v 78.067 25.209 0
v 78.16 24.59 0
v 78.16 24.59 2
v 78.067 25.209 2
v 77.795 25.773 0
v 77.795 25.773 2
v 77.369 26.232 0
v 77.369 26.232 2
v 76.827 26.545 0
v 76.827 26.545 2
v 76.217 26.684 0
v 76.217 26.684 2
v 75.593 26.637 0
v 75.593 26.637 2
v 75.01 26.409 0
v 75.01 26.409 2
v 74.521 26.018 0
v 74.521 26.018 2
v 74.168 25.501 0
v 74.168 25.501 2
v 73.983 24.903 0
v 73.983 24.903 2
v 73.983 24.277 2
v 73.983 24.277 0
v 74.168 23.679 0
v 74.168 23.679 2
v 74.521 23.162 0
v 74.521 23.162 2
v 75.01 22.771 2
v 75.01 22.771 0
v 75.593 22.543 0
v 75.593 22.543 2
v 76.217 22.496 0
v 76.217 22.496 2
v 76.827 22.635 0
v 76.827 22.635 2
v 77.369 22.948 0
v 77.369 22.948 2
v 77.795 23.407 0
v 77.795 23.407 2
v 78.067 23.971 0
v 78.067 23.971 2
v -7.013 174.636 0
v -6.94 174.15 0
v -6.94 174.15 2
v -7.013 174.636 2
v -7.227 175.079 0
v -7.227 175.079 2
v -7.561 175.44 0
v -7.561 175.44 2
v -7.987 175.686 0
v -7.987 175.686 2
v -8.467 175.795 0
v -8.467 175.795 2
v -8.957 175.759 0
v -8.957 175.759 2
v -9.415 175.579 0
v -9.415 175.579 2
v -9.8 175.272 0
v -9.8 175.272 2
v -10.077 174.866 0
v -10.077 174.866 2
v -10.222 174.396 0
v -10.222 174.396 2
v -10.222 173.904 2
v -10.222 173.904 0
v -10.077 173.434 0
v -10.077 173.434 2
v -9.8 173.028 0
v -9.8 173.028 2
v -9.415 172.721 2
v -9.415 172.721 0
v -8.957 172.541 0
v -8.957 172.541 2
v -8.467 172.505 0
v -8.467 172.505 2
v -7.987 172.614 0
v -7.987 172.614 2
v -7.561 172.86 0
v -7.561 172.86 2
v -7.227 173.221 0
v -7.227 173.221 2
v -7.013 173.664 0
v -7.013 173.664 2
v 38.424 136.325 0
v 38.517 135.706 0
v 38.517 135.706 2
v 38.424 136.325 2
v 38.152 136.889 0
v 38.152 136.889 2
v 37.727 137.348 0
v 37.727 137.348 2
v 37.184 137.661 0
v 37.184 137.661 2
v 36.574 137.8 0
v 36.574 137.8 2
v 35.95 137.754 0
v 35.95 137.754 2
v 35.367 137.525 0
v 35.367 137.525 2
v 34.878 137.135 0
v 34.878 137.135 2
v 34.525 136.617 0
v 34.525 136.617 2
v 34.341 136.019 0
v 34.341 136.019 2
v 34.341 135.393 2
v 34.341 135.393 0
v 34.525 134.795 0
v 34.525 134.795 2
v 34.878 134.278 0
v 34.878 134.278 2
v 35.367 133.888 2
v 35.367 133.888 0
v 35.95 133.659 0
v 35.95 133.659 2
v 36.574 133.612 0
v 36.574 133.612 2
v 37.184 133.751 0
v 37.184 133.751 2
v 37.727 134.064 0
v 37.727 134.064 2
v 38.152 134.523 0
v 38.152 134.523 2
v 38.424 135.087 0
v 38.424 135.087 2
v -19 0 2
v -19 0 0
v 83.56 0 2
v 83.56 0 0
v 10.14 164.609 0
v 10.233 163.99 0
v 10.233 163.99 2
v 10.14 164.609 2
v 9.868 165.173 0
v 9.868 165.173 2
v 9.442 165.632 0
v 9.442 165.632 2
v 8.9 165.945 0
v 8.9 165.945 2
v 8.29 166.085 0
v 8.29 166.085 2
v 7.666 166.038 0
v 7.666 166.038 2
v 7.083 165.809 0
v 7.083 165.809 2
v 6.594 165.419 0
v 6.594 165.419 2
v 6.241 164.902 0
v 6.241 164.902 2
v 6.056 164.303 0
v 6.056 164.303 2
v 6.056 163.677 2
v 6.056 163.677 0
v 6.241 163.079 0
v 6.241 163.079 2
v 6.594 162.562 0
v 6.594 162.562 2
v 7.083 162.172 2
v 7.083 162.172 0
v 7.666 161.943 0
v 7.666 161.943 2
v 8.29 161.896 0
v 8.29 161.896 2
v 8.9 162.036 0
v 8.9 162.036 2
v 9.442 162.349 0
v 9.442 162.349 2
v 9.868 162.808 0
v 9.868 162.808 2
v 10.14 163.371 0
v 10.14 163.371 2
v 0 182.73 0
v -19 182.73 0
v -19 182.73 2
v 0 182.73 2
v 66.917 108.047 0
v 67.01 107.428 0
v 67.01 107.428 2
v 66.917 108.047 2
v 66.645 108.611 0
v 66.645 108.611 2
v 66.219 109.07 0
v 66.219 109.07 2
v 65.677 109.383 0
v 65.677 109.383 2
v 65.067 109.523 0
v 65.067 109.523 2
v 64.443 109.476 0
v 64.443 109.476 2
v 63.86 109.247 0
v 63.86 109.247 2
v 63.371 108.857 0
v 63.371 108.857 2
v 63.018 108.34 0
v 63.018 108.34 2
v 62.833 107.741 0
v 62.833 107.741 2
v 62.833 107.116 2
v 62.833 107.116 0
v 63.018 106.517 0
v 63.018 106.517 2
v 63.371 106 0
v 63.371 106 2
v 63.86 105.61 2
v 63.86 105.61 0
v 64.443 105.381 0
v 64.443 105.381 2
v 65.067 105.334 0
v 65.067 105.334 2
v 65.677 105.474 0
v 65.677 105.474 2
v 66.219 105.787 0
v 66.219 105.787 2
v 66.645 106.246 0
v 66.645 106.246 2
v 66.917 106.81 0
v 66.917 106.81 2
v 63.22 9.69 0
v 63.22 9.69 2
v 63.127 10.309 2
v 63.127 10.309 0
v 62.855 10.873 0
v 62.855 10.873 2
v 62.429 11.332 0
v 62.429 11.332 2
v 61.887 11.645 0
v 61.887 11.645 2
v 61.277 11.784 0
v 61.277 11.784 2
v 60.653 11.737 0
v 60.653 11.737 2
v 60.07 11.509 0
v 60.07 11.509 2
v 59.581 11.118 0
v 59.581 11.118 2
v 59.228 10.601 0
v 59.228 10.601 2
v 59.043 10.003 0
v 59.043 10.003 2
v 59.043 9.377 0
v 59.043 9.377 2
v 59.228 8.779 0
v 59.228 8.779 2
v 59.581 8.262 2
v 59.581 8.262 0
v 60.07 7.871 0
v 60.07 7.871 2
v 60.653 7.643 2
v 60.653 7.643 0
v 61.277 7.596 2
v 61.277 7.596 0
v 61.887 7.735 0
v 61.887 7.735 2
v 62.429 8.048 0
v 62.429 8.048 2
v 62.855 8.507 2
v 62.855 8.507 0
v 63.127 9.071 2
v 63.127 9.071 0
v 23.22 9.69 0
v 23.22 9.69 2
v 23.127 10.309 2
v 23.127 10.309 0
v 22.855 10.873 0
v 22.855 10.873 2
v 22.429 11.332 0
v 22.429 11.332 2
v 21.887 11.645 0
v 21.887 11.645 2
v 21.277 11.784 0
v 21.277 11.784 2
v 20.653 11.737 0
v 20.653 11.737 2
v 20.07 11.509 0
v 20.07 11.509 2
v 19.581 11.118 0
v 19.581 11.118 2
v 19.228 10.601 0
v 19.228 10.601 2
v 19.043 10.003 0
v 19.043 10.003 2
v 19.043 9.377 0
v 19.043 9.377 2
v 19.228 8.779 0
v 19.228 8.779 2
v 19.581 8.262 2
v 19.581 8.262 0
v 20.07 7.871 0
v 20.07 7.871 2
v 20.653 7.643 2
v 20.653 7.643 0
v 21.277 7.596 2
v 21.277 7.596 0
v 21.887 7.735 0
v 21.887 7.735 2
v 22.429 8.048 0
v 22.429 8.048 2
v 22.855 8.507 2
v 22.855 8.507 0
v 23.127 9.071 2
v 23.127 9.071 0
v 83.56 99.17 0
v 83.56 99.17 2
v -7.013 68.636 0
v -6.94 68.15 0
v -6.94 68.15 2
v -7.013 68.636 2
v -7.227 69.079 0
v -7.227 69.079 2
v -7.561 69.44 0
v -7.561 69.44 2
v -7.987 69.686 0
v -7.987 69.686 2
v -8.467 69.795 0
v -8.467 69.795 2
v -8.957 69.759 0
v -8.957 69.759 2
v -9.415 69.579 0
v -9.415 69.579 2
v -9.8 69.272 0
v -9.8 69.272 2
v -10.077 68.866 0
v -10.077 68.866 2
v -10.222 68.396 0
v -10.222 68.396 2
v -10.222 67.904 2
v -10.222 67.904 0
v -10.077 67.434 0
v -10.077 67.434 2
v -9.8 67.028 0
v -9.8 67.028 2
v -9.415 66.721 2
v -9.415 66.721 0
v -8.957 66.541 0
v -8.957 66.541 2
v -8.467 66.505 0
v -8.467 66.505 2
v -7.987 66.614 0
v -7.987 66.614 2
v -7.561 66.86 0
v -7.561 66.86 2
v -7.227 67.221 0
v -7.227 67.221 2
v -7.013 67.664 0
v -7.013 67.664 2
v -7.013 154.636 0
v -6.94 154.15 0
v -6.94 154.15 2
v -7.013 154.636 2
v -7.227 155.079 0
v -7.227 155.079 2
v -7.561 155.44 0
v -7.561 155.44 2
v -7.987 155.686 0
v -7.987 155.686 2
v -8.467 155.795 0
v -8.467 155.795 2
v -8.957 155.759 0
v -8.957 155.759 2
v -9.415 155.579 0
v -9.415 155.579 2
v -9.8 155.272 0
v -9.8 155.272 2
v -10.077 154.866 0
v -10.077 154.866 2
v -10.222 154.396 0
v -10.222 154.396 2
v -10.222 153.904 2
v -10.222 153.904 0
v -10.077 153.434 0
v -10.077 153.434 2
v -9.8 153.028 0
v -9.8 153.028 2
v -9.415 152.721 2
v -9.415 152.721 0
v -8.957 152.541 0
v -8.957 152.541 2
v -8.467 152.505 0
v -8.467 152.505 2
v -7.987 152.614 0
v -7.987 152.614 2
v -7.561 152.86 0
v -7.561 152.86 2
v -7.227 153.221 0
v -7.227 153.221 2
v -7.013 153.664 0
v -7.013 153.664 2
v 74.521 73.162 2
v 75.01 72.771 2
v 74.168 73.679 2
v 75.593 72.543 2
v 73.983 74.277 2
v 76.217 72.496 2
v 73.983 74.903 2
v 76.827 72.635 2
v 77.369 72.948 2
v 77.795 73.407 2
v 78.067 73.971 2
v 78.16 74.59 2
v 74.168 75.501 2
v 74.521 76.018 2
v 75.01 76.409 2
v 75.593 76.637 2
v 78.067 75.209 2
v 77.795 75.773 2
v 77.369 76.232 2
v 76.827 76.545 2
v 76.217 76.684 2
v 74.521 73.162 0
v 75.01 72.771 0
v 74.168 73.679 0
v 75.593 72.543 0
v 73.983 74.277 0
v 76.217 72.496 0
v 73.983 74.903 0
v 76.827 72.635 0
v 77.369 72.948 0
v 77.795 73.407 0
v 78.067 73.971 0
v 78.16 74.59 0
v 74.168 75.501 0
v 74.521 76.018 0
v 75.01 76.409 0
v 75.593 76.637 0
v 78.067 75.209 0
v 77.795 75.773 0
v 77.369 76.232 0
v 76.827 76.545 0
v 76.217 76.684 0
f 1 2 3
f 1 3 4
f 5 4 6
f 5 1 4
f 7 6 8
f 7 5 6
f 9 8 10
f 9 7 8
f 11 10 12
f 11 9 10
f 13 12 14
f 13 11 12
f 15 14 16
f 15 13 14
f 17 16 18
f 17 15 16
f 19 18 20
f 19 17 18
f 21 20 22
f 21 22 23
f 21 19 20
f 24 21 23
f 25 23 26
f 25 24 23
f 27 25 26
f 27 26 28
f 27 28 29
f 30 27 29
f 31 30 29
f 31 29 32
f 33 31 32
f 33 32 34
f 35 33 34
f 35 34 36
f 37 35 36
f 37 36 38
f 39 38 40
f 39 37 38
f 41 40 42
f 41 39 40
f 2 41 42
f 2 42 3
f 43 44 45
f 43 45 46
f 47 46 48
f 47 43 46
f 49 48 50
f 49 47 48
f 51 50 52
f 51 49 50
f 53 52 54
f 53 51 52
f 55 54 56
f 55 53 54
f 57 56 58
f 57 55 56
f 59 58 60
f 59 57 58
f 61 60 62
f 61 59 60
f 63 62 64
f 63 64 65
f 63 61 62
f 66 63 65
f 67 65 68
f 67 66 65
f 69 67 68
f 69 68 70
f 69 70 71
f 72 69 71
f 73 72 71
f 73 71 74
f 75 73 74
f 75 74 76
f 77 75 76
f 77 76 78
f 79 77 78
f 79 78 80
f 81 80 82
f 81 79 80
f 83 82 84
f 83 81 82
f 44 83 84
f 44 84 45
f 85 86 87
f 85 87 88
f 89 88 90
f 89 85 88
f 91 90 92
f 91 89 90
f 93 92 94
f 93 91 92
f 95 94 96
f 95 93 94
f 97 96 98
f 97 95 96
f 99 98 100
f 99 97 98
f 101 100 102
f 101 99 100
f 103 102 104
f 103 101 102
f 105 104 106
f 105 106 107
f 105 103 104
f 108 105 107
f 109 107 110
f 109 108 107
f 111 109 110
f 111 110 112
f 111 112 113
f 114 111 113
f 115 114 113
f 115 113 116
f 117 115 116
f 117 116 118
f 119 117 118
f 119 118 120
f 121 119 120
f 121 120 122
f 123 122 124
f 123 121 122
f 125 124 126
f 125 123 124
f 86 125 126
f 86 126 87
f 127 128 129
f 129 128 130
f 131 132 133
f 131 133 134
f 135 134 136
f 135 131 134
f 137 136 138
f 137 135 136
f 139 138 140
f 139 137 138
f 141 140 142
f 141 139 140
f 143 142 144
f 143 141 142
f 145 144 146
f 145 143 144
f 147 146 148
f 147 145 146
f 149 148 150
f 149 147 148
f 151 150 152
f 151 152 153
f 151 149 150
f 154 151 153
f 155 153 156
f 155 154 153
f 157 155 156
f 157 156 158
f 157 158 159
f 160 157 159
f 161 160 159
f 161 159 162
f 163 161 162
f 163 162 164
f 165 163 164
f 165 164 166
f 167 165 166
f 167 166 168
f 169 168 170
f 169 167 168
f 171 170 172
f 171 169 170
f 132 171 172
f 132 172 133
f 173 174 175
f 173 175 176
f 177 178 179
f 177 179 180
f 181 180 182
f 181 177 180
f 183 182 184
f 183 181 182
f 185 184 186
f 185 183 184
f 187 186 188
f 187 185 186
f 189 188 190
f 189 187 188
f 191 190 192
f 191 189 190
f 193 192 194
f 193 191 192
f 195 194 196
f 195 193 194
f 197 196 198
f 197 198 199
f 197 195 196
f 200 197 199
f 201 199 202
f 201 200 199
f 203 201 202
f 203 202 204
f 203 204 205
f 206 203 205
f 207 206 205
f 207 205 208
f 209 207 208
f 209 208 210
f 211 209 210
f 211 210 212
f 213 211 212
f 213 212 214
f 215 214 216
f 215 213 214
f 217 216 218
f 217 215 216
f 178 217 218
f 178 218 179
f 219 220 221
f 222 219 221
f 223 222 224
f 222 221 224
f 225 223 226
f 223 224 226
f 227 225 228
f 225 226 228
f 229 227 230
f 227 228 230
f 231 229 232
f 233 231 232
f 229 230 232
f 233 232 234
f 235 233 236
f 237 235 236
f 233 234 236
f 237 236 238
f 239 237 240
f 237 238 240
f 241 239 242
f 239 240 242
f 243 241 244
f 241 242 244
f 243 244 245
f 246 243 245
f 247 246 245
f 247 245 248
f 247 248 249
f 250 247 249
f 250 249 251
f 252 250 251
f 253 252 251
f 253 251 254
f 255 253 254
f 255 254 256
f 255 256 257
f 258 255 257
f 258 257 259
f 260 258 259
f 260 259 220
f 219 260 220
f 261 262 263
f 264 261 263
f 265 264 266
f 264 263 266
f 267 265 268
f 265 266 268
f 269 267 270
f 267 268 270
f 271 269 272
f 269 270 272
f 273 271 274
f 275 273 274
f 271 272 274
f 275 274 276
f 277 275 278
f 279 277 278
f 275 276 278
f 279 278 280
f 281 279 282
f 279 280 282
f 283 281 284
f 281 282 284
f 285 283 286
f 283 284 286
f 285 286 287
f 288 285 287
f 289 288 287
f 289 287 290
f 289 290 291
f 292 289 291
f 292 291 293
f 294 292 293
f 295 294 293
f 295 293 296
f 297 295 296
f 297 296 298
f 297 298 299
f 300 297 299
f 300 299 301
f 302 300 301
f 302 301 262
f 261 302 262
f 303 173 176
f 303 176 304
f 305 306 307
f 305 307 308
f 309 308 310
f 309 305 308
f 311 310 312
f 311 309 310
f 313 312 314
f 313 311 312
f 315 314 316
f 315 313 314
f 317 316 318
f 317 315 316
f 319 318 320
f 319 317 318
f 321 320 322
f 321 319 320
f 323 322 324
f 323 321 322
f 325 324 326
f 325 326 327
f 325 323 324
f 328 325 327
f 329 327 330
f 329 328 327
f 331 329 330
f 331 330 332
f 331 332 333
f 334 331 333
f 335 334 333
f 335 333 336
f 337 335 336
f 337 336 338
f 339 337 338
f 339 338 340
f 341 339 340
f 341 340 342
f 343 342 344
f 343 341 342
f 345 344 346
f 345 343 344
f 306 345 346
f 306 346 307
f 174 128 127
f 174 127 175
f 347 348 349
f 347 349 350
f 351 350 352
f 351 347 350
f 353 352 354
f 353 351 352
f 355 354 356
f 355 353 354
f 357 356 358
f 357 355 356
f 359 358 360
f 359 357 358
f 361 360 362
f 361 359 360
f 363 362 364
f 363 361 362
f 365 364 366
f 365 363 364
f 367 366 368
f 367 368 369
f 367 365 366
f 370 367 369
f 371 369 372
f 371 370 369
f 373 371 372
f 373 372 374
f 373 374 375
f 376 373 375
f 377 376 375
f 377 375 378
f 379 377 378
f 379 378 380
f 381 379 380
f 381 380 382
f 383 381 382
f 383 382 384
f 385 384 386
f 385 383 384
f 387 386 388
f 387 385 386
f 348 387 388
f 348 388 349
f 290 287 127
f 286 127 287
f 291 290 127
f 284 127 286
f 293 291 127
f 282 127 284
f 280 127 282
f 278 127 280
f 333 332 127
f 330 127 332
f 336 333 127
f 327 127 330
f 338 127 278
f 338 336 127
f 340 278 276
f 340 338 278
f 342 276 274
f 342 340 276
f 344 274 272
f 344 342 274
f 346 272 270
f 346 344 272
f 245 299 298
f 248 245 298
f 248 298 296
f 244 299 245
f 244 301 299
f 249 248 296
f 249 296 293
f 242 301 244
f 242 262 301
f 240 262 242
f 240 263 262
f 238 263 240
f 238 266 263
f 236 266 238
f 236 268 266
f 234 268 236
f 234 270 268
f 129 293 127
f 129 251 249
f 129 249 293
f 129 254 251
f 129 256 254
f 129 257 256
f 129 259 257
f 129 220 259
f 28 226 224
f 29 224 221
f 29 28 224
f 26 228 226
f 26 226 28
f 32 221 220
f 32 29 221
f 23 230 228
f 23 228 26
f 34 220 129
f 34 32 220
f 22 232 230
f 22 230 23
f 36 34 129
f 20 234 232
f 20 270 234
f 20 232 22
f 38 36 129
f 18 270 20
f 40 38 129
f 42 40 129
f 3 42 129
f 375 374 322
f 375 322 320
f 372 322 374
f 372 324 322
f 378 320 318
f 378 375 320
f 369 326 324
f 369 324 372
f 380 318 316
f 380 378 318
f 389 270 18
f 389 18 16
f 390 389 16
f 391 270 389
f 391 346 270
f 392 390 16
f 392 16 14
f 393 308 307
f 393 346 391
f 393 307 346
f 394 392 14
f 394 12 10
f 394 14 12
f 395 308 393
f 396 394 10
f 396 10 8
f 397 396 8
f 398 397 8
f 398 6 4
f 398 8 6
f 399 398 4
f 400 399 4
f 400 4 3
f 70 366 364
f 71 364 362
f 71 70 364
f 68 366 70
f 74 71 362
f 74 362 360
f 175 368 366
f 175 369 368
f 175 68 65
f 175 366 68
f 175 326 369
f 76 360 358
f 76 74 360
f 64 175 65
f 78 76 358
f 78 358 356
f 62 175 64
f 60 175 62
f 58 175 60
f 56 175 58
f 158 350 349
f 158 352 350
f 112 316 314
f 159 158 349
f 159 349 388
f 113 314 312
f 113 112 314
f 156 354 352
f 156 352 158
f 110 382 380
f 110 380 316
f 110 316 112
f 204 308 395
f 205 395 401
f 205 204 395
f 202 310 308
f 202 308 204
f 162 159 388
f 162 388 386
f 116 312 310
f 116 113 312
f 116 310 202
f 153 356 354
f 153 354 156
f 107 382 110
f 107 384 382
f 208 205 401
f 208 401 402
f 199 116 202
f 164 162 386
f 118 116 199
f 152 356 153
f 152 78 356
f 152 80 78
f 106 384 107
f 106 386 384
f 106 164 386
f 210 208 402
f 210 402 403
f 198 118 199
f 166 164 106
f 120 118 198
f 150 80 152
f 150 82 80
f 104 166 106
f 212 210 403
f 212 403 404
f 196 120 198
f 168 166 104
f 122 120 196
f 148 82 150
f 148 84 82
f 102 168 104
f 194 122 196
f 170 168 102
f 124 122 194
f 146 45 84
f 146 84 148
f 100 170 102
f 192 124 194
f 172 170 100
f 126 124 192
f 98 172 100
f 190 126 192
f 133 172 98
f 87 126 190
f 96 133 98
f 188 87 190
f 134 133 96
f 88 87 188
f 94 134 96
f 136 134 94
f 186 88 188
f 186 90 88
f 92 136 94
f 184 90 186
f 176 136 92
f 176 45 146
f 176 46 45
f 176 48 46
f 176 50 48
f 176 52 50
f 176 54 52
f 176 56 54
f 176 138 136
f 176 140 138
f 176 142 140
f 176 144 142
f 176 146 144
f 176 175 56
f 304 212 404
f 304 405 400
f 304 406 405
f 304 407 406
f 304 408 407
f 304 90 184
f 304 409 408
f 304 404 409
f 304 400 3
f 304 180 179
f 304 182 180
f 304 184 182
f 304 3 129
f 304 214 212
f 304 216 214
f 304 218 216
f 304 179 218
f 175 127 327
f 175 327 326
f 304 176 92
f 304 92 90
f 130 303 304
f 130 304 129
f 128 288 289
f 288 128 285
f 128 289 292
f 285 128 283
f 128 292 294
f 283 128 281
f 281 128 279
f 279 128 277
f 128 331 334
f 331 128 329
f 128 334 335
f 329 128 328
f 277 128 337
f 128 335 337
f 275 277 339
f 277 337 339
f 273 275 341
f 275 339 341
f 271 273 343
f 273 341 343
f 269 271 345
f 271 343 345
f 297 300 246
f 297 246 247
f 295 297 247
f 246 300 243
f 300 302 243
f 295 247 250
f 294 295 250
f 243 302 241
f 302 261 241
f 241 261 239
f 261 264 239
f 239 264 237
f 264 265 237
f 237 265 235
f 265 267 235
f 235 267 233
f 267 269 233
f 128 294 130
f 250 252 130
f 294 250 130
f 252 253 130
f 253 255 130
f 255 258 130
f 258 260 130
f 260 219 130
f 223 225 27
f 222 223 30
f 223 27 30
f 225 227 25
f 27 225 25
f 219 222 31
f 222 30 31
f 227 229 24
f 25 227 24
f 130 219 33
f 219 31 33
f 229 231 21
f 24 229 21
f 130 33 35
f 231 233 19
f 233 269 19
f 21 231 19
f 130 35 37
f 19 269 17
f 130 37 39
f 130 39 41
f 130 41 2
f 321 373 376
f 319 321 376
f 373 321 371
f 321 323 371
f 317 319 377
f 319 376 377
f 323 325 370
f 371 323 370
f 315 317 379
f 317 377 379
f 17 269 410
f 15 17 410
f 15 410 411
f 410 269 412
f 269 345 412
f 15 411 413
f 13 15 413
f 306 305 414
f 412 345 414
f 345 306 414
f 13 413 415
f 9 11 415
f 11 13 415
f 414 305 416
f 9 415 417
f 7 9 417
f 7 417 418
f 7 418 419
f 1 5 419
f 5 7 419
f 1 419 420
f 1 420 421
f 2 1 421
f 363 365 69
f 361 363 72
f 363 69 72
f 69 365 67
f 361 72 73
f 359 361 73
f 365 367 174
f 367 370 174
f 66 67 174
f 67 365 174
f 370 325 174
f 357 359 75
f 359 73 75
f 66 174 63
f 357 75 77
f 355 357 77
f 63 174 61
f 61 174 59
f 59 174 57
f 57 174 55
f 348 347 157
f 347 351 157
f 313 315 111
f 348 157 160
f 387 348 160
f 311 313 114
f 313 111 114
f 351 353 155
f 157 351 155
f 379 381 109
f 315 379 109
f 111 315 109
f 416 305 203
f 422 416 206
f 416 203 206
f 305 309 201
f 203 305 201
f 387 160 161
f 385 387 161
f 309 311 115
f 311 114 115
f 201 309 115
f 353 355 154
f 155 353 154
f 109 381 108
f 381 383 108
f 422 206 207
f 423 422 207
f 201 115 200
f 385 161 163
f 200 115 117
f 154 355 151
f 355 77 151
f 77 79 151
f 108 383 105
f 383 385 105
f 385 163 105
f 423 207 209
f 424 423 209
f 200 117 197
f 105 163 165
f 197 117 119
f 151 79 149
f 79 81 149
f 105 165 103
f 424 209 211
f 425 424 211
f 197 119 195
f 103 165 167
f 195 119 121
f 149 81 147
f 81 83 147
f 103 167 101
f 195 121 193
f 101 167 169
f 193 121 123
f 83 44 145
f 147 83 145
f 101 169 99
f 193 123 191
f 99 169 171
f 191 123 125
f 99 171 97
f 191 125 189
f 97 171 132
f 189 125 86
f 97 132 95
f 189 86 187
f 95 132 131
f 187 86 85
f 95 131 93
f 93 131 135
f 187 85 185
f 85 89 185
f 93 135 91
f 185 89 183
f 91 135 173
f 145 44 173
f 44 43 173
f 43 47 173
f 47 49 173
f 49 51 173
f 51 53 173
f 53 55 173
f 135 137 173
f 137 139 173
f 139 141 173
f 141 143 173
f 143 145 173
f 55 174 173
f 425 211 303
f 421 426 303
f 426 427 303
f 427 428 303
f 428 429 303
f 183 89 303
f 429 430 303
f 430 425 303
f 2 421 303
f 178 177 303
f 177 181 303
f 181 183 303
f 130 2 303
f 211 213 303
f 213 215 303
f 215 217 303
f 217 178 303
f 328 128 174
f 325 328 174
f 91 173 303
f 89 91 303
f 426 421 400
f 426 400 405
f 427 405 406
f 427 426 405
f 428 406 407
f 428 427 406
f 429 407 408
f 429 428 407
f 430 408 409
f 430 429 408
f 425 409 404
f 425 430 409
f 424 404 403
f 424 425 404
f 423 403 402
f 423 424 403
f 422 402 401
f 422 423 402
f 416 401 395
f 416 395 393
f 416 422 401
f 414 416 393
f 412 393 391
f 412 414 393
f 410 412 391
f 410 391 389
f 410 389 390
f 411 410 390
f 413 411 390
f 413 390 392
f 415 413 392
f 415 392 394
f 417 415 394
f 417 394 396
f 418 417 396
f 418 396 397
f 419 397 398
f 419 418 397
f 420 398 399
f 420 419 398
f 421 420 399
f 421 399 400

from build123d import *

# Parameters (mm, degrees)
SKETCH_1_R          = 2.1
EXTRUDE_1_DEPTH     = 2
SKETCH_2_R          = 2.1
CUT_EXTRUDE_1_DEPTH = 10
M4X0_7_1_OUTLINE_W  = 19
M4X0_7_1_OUTLINE_H  = 182.73
M4X0_7_1_OUTLINE_R  = 1.65
M4X0_7_1_DEPTH      = 2


# Read off the part's stored shape, not the designer's step: M4x0.7 ねじ穴1
with BuildPart() as part:
    # ｽｹｯﾁ1 → ﾎﾞｽ - 押し出し1 (new body)
    with BuildSketch(Plane.XY):
        Polygon((0, 0), (0, 182.73), (83.56, 99.17), (83.56, 0), align=None)
        with Locations((8.132919651, 163.990478631)):
            Circle(SKETCH_1_R, mode=Mode.SUBTRACT)
        with Locations((36.417190898, 135.706207384)):
            Circle(SKETCH_1_R, mode=Mode.SUBTRACT)
        with Locations((64.91002614, 107.428490375)):
            Circle(SKETCH_1_R, mode=Mode.SUBTRACT)
        with Locations((76.06, 74.59)):
            Circle(SKETCH_1_R, mode=Mode.SUBTRACT)
        with Locations((76.06, 24.59)):
            Circle(SKETCH_1_R, mode=Mode.SUBTRACT)
    extrude(amount=EXTRUDE_1_DEPTH)

    # ｽｹｯﾁ2 → ｶｯﾄ - 押し出し1 (cut)
    with BuildSketch(Plane.XY.offset(2)):
        with Locations((21.12, 9.69)):
            Circle(SKETCH_2_R)
        with Locations((61.12, 9.69)):
            Circle(SKETCH_2_R)
    extrude(amount=-CUT_EXTRUDE_1_DEPTH, mode=Mode.SUBTRACT)

    # M4x0.7 ねじ穴1 outline → M4x0.7 ねじ穴1 (add)
    with BuildSketch(Plane.XY):
        with Locations((-9.5, 91.365)):
            Rectangle(M4X0_7_1_OUTLINE_W, M4X0_7_1_OUTLINE_H)
        with Locations((-8.59, 68.15)):
            Circle(M4X0_7_1_OUTLINE_R, mode=Mode.SUBTRACT)
        with Locations((-8.59, 154.15)):
            Circle(M4X0_7_1_OUTLINE_R, mode=Mode.SUBTRACT)
        with Locations((-8.59, 174.15)):
            Circle(M4X0_7_1_OUTLINE_R, mode=Mode.SUBTRACT)
    extrude(amount=M4X0_7_1_DEPTH)


solid = part.part
